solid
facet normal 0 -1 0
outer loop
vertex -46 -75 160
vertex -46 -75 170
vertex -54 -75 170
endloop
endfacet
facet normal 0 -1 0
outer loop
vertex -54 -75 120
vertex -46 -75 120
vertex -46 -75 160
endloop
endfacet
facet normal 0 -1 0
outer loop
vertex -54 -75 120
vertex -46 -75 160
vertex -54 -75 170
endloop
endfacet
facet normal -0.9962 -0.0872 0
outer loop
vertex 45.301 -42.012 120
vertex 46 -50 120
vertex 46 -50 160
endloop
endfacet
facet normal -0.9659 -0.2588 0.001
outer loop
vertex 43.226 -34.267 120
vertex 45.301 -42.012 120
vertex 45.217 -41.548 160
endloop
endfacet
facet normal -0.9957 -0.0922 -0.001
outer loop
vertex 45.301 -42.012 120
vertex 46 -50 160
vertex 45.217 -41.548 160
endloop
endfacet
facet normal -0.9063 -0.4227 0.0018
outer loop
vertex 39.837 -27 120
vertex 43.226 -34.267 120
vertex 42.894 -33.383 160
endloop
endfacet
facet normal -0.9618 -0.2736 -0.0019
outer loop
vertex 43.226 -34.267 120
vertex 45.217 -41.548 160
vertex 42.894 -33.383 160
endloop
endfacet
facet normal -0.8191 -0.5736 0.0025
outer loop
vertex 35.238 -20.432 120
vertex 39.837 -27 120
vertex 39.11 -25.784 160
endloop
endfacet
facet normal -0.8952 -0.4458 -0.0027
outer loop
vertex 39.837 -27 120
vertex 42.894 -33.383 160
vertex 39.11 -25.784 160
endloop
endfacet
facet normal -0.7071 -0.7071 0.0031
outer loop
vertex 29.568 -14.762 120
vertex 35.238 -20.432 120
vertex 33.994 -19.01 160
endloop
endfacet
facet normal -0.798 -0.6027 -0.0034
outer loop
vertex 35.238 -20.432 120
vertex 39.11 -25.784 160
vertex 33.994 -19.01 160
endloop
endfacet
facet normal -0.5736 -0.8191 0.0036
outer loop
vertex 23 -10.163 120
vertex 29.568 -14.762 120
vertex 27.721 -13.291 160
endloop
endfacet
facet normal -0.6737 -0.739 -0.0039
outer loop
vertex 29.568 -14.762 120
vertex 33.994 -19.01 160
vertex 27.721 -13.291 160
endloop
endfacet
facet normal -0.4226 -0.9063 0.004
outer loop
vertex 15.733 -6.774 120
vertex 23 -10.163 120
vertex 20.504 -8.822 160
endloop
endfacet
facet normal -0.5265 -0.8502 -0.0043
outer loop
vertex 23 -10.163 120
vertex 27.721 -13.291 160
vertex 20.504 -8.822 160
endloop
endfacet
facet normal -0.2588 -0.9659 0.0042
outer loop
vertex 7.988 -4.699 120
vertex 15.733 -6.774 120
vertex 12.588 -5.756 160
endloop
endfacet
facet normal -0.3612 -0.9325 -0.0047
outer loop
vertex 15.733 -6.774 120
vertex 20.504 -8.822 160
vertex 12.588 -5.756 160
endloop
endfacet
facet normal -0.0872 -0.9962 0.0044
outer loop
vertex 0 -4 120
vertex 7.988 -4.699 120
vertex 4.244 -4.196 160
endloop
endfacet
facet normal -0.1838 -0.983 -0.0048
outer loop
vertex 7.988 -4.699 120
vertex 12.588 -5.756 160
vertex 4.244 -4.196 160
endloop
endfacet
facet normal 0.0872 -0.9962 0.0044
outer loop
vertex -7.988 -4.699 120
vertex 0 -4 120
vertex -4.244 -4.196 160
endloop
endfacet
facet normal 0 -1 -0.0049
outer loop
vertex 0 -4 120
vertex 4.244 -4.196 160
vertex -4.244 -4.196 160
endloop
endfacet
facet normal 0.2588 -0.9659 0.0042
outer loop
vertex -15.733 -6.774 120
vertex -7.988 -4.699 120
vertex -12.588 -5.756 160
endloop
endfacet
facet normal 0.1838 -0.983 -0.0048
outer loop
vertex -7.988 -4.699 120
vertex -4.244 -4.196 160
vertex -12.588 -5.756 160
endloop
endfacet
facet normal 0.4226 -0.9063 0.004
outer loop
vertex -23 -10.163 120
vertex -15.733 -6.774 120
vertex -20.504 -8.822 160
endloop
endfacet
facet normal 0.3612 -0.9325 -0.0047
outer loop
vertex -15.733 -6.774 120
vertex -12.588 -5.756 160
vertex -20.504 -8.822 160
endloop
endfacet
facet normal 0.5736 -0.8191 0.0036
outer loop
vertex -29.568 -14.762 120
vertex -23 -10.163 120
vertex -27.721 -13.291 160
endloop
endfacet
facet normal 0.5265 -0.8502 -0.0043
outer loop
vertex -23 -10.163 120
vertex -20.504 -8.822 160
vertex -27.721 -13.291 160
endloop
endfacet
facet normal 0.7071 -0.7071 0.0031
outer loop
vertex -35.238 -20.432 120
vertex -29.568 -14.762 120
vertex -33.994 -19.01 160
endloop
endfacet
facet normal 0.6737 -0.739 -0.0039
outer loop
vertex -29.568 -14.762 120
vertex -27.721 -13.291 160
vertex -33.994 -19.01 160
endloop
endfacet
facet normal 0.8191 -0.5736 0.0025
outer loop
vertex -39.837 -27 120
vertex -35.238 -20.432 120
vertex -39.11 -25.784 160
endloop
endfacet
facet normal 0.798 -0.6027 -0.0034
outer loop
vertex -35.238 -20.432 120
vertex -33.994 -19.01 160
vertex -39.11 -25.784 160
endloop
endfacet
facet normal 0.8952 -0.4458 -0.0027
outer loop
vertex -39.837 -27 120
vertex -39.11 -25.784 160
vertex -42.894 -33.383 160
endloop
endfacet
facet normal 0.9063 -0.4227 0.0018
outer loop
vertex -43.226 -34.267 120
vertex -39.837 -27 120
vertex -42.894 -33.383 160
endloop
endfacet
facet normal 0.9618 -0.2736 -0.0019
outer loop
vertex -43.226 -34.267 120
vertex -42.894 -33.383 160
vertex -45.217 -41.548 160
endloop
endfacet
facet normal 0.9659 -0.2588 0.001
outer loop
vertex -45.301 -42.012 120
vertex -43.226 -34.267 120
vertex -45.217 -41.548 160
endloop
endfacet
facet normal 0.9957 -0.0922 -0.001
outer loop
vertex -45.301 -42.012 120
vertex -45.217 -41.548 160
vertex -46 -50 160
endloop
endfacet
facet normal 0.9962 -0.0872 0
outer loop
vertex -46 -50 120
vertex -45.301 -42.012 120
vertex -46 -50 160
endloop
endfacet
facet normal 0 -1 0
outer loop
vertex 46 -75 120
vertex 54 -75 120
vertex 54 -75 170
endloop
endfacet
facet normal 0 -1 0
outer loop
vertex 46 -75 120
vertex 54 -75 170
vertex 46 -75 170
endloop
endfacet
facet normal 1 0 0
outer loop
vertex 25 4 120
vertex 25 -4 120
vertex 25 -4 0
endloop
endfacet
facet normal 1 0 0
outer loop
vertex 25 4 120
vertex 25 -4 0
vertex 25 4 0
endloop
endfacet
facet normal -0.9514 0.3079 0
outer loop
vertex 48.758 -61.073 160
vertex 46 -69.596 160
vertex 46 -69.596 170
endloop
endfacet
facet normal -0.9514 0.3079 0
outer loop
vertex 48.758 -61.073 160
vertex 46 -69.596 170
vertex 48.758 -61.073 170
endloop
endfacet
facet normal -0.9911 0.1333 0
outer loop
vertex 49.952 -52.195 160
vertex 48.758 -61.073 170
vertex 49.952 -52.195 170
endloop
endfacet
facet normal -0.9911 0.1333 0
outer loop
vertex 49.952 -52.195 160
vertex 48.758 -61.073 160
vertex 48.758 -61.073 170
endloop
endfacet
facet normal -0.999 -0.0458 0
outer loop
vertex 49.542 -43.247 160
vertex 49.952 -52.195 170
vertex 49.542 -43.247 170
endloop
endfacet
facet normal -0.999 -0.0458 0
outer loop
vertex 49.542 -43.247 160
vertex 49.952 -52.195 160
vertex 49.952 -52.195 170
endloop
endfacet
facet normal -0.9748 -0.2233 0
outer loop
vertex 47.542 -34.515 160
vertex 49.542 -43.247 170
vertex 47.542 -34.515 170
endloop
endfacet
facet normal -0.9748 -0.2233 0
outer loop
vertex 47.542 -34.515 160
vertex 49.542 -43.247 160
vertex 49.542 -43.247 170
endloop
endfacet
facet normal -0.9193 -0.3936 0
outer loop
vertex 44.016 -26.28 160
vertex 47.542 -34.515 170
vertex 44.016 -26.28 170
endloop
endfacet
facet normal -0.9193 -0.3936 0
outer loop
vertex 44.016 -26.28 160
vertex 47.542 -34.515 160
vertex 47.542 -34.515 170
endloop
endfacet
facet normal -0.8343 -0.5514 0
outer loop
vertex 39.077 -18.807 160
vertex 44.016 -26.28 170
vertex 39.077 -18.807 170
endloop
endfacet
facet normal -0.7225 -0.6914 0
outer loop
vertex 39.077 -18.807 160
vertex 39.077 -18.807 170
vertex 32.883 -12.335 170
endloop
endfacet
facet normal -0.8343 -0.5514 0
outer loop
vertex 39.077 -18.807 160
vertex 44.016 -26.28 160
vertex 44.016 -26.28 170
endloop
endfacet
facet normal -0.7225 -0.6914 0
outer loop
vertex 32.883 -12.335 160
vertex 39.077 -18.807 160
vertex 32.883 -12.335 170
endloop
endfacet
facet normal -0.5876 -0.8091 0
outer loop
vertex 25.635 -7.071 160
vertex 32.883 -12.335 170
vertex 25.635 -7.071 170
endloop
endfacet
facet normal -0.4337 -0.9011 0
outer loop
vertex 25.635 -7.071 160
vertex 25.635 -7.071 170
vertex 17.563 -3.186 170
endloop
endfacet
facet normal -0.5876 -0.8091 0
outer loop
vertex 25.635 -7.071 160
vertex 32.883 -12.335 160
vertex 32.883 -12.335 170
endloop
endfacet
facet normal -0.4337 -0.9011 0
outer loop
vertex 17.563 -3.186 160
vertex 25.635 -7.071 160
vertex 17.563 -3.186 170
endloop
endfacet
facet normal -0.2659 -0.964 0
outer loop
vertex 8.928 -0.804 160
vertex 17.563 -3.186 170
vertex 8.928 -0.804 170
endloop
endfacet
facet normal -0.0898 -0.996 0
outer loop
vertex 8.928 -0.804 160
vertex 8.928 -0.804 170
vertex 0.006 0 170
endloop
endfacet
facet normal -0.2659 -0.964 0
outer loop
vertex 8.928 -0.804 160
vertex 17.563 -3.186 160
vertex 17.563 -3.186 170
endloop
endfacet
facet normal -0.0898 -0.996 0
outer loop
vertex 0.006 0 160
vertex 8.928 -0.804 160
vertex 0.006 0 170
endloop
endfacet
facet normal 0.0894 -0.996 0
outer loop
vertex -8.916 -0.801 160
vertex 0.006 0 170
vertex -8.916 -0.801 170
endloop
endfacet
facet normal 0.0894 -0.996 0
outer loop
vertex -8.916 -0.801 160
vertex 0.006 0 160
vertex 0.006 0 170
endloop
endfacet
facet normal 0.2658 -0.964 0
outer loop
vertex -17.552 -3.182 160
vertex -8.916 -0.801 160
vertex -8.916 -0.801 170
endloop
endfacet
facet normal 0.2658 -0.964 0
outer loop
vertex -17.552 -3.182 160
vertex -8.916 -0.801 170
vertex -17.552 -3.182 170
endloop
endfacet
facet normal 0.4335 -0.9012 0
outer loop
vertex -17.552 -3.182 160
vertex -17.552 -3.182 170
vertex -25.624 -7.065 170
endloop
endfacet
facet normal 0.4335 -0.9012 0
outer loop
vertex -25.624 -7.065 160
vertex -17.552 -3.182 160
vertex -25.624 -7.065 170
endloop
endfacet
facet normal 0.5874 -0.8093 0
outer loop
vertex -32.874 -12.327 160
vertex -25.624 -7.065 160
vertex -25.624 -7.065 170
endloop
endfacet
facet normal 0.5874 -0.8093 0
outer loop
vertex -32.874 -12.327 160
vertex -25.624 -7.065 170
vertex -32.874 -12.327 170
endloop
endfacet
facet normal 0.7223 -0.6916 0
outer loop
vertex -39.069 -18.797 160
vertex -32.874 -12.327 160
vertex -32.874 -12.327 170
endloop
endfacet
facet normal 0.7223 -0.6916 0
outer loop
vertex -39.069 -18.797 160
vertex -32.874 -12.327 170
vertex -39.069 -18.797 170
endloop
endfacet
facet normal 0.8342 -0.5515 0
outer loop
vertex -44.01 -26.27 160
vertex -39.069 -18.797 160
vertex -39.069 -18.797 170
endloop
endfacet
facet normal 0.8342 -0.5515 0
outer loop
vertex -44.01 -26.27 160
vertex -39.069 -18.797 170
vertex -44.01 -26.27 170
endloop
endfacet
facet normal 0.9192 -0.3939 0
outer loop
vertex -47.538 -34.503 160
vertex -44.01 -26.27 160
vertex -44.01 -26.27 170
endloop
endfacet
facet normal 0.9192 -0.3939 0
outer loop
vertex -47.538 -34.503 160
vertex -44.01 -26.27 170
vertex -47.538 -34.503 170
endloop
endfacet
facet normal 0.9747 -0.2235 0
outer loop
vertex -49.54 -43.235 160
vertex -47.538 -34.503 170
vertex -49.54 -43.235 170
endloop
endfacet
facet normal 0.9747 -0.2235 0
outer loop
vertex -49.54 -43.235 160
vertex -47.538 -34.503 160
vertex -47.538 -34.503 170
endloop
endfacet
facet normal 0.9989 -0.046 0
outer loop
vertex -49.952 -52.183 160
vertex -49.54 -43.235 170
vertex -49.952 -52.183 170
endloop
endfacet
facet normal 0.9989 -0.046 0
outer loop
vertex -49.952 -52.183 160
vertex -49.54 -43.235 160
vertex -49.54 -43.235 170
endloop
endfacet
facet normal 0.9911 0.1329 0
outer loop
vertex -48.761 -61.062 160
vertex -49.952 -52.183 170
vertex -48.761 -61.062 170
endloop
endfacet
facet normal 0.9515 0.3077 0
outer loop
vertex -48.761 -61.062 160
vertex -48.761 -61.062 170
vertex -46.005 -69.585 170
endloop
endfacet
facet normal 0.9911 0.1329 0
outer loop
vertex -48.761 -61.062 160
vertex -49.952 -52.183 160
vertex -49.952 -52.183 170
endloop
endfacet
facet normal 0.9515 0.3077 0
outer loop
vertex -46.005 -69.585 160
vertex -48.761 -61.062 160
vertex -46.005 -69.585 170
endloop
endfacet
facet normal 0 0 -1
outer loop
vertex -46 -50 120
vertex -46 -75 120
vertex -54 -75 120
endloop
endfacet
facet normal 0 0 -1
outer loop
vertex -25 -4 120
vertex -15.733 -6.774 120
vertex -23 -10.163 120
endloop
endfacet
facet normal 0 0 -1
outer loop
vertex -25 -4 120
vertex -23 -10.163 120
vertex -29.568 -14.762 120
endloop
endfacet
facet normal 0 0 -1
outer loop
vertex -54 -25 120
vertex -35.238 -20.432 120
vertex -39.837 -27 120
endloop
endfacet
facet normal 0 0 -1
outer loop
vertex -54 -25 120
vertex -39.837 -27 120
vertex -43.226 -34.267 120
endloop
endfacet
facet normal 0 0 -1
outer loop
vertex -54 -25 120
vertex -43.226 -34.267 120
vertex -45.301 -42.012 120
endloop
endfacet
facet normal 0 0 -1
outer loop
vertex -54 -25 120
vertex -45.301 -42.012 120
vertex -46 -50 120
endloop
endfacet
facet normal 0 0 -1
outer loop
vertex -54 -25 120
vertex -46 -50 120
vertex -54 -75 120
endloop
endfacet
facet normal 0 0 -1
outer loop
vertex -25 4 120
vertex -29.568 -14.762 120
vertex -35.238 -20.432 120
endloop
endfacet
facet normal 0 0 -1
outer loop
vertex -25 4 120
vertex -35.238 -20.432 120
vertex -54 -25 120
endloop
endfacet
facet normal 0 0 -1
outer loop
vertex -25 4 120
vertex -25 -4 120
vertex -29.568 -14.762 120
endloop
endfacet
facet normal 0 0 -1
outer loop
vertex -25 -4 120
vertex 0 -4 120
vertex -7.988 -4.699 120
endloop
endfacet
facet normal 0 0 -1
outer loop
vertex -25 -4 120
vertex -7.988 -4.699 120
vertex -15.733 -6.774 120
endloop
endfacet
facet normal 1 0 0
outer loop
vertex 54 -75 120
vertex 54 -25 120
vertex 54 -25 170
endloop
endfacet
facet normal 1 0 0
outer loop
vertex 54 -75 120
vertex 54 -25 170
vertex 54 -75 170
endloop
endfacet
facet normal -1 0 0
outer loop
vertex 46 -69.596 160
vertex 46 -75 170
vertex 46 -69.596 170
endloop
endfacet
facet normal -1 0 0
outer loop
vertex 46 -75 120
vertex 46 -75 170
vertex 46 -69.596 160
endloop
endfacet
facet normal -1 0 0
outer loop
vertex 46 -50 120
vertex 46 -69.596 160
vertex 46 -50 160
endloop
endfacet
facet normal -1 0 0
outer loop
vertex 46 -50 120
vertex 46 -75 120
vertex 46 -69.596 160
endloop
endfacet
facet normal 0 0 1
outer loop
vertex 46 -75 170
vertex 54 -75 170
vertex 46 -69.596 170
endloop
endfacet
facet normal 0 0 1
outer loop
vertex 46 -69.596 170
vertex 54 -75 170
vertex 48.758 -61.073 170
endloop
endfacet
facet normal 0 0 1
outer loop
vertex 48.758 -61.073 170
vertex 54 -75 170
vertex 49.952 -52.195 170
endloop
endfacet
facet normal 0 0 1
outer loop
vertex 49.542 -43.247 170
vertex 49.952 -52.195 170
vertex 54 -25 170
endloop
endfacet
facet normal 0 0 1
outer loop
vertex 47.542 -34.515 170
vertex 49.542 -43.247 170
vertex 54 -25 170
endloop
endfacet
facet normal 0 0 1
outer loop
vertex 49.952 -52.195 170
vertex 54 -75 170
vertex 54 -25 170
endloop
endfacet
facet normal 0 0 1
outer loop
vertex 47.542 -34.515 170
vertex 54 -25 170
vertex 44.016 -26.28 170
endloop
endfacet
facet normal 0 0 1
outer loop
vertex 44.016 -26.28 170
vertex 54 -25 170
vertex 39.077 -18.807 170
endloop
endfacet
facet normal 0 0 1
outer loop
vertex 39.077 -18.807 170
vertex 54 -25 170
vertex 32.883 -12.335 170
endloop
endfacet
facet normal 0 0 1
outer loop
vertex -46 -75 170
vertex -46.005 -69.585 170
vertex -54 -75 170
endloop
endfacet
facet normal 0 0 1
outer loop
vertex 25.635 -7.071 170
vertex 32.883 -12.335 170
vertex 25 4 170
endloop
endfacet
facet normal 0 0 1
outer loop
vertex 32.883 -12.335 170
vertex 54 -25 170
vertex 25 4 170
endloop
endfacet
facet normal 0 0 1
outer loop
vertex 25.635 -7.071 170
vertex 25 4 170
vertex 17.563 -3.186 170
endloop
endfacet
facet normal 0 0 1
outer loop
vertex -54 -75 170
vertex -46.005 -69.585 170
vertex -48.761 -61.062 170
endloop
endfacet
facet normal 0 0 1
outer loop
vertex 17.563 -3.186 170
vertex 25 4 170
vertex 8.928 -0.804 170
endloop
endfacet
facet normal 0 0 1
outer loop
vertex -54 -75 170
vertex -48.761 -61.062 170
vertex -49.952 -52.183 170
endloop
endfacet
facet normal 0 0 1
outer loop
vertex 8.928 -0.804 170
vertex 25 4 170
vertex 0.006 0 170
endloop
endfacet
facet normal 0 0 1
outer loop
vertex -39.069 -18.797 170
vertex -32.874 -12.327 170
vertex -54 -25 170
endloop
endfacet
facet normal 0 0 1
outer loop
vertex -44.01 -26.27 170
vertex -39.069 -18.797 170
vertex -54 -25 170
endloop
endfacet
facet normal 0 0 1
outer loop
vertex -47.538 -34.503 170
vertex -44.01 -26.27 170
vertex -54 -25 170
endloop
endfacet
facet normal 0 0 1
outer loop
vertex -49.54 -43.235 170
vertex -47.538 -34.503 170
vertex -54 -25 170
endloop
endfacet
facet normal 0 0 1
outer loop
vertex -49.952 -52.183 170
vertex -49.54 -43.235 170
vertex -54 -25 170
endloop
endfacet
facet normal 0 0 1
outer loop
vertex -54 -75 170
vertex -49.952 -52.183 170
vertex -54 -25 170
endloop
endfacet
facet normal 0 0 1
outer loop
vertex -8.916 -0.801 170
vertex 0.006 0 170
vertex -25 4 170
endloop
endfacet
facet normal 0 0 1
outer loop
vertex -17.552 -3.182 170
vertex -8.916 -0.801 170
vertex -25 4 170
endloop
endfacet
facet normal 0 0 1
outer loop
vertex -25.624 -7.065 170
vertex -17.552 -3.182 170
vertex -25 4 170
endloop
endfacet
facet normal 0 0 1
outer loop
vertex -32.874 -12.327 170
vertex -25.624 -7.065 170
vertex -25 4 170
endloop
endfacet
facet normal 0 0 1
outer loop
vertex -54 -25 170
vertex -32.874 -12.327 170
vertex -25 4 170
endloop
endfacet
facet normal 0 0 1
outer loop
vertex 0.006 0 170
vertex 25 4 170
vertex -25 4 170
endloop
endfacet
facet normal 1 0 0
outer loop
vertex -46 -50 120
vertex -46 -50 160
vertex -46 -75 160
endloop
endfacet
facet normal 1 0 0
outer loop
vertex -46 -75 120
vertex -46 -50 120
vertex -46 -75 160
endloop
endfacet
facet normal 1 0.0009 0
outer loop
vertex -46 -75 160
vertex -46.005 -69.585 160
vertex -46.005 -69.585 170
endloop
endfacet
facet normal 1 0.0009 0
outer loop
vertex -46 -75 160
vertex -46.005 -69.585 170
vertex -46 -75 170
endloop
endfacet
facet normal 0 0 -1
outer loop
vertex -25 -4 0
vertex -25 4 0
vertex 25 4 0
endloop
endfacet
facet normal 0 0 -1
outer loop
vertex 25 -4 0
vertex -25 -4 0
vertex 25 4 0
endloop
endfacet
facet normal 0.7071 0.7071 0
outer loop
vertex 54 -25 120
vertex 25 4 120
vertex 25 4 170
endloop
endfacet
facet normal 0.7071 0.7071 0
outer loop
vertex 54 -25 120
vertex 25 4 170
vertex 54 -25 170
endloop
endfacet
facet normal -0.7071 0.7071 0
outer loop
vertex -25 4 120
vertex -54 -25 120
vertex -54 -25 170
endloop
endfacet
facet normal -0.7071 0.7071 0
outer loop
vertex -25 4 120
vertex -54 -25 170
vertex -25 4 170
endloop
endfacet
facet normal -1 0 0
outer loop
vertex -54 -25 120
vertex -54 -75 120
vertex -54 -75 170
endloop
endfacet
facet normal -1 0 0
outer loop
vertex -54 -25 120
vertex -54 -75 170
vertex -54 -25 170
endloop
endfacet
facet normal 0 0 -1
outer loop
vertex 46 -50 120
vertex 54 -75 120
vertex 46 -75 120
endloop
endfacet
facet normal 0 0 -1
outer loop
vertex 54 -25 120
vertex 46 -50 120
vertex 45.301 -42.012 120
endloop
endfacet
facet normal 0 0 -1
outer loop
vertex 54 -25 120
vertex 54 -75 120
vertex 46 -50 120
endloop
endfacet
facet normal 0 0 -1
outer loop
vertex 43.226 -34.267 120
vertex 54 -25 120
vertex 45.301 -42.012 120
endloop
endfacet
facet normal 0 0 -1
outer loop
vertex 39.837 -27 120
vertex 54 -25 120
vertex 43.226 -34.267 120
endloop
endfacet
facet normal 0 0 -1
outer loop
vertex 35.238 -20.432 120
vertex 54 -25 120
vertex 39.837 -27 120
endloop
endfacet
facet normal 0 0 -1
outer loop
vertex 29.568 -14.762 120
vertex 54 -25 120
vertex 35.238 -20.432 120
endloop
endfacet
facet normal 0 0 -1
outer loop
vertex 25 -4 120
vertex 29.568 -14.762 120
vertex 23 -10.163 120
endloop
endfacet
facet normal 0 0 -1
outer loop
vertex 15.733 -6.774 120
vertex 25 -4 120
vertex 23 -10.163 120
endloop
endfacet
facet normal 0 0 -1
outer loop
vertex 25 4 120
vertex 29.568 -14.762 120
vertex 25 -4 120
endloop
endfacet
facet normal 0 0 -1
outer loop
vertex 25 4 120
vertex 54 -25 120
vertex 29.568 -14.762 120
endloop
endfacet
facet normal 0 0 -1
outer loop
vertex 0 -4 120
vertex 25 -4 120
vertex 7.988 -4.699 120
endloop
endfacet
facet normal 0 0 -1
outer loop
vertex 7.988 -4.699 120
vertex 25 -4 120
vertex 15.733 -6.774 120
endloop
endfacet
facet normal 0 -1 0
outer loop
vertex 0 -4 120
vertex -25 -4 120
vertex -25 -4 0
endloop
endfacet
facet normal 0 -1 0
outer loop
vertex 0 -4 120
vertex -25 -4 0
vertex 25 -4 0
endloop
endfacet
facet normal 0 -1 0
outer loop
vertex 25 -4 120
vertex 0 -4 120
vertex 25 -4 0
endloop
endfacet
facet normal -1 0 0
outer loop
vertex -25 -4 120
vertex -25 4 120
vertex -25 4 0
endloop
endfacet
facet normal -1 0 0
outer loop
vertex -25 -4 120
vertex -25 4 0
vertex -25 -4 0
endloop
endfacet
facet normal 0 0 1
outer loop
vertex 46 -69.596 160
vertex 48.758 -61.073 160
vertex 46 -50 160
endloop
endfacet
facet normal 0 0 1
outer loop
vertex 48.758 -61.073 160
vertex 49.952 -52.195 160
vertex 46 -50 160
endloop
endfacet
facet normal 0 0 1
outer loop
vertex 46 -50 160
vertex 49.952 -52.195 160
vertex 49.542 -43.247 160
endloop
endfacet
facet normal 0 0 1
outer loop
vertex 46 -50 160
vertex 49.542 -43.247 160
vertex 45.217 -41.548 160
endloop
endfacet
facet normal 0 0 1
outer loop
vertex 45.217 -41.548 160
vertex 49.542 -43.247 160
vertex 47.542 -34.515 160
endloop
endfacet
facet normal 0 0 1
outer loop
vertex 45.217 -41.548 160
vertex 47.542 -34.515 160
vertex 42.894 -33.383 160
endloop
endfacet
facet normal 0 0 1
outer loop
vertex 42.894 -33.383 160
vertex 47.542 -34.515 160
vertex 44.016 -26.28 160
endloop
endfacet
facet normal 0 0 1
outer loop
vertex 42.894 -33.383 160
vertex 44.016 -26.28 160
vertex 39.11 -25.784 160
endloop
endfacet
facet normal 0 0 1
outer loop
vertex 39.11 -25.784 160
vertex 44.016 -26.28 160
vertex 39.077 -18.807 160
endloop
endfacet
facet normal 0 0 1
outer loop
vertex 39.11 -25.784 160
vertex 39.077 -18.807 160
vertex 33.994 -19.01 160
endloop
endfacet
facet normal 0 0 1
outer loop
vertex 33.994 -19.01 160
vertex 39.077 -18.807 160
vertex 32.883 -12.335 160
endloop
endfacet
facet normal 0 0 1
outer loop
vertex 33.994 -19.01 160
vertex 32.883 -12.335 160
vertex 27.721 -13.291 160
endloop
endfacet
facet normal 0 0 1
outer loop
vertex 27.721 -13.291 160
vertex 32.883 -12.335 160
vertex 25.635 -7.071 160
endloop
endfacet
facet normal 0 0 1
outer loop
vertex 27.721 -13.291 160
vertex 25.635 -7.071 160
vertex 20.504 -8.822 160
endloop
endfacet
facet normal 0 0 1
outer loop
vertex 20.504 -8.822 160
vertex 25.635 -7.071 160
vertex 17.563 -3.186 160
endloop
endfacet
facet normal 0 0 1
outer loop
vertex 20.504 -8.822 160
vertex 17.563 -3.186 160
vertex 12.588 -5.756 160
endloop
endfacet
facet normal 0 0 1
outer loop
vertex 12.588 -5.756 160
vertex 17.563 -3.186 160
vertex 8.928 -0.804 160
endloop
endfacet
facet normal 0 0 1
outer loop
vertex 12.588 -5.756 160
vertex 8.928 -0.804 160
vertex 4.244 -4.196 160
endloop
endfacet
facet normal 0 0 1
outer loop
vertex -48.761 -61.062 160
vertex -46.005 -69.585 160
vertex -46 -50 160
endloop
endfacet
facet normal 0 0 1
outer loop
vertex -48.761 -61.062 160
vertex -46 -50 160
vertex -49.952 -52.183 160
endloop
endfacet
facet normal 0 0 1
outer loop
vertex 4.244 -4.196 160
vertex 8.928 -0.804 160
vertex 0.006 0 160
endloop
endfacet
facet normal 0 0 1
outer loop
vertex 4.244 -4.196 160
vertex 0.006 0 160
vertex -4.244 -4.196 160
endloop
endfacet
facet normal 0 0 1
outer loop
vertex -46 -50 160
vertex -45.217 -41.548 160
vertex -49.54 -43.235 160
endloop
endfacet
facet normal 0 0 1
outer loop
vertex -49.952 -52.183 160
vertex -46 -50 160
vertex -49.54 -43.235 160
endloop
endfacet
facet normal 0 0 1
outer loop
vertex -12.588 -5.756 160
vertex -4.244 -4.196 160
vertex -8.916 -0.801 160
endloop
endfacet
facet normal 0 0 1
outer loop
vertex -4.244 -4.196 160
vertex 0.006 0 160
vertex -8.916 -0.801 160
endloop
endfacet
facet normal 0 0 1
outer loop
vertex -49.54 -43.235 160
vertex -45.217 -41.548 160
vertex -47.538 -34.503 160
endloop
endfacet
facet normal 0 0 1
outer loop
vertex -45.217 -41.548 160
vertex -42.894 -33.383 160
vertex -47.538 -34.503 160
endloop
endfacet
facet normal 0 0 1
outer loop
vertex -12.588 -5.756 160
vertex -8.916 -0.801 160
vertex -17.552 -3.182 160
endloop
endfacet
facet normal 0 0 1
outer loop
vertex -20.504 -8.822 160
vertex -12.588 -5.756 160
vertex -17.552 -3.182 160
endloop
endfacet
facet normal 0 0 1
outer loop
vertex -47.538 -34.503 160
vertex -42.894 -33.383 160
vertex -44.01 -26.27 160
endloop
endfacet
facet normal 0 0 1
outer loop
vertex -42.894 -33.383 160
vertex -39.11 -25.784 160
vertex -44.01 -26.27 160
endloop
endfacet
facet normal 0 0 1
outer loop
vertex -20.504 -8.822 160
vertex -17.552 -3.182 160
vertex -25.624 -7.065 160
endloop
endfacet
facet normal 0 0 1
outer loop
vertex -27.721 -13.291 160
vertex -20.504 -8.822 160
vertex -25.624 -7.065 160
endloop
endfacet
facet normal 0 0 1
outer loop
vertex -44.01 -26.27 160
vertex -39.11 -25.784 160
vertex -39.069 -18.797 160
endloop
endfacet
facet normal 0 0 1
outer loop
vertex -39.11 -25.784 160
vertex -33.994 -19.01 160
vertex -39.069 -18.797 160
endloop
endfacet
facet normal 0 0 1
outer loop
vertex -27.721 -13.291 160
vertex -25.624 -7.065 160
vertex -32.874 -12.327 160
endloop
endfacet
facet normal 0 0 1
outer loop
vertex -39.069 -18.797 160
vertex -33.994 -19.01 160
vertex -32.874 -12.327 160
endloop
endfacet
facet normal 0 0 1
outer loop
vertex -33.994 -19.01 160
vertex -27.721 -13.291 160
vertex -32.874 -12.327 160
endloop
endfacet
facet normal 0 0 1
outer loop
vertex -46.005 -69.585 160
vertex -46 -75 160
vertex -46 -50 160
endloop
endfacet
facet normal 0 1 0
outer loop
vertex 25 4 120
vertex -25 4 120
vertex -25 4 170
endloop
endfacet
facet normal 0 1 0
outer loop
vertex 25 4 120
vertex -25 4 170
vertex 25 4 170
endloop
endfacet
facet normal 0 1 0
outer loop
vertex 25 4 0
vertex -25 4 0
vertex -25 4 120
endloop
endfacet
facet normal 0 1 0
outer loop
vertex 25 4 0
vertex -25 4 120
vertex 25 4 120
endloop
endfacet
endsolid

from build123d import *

# Parameters (mm, degrees)
SKETCH_1_W      = 50
SKETCH_1_H      = 8
EXTRUDE_1_DEPTH = 40
EXTRUDE_2_DEPTH = 10


with BuildPart() as part:
    # 扫描1: sweep along a path in 草图2
    with BuildLine(Plane(origin=(0, 0, 0), x_dir=(0, 0, -1), z_dir=(1, 0, 0))) as sweep_1_path:
        Line((0, 55.298323556), (-160, 55.298323556))
    # 草图1 → 扫描1 (sweep)
    with BuildSketch(Plane.XY):
        Rectangle(SKETCH_1_W, SKETCH_1_H)
    sweep(path=sweep_1_path.line)

    # 草图4 → 凸台-拉伸1 (add)
    with BuildSketch(Plane.XY.offset(160)):
        with BuildLine():
            Line((-54, -25), (-25, 4))
            Line((-25, 4), (25, 4))
            Line((25, 4), (54, -25))
            Line((54, -25), (54, -75))
            Line((54, -75), (46, -75))
            Line((46, -75), (46, -50))
            ThreePointArc((46, -50), (0, -4), (-46, -50))
            Line((-46, -50), (-46, -75))
            Line((-46, -75), (-54, -75))
            Line((-54, -75), (-54, -25))
        make_face()
    extrude(amount=-EXTRUDE_1_DEPTH)

    # 草图5 → 凸台-拉伸2 (add)
    with BuildSketch(Plane.XY.offset(160)):
        with BuildLine():
            Line((-46.0046646, -69.584964515), (-46, -75))
            Line((-46, -75), (-54, -75))
            Line((-54, -75), (-54, -25))
            Line((-54, -25), (-25, 4))
            Line((-25, 4), (25, 4))
            Line((25, 4), (54, -25))
            Line((54, -25), (54, -75))
            Line((54, -75), (46, -75))
            Line((46, -75), (46, -69.595917942))
            ThreePointArc((46, -69.595917942), (0.005952648, -3.54e-07), (-46.0046646, -69.584964515))
        make_face()
    extrude(amount=EXTRUDE_2_DEPTH)


solid = part.part
